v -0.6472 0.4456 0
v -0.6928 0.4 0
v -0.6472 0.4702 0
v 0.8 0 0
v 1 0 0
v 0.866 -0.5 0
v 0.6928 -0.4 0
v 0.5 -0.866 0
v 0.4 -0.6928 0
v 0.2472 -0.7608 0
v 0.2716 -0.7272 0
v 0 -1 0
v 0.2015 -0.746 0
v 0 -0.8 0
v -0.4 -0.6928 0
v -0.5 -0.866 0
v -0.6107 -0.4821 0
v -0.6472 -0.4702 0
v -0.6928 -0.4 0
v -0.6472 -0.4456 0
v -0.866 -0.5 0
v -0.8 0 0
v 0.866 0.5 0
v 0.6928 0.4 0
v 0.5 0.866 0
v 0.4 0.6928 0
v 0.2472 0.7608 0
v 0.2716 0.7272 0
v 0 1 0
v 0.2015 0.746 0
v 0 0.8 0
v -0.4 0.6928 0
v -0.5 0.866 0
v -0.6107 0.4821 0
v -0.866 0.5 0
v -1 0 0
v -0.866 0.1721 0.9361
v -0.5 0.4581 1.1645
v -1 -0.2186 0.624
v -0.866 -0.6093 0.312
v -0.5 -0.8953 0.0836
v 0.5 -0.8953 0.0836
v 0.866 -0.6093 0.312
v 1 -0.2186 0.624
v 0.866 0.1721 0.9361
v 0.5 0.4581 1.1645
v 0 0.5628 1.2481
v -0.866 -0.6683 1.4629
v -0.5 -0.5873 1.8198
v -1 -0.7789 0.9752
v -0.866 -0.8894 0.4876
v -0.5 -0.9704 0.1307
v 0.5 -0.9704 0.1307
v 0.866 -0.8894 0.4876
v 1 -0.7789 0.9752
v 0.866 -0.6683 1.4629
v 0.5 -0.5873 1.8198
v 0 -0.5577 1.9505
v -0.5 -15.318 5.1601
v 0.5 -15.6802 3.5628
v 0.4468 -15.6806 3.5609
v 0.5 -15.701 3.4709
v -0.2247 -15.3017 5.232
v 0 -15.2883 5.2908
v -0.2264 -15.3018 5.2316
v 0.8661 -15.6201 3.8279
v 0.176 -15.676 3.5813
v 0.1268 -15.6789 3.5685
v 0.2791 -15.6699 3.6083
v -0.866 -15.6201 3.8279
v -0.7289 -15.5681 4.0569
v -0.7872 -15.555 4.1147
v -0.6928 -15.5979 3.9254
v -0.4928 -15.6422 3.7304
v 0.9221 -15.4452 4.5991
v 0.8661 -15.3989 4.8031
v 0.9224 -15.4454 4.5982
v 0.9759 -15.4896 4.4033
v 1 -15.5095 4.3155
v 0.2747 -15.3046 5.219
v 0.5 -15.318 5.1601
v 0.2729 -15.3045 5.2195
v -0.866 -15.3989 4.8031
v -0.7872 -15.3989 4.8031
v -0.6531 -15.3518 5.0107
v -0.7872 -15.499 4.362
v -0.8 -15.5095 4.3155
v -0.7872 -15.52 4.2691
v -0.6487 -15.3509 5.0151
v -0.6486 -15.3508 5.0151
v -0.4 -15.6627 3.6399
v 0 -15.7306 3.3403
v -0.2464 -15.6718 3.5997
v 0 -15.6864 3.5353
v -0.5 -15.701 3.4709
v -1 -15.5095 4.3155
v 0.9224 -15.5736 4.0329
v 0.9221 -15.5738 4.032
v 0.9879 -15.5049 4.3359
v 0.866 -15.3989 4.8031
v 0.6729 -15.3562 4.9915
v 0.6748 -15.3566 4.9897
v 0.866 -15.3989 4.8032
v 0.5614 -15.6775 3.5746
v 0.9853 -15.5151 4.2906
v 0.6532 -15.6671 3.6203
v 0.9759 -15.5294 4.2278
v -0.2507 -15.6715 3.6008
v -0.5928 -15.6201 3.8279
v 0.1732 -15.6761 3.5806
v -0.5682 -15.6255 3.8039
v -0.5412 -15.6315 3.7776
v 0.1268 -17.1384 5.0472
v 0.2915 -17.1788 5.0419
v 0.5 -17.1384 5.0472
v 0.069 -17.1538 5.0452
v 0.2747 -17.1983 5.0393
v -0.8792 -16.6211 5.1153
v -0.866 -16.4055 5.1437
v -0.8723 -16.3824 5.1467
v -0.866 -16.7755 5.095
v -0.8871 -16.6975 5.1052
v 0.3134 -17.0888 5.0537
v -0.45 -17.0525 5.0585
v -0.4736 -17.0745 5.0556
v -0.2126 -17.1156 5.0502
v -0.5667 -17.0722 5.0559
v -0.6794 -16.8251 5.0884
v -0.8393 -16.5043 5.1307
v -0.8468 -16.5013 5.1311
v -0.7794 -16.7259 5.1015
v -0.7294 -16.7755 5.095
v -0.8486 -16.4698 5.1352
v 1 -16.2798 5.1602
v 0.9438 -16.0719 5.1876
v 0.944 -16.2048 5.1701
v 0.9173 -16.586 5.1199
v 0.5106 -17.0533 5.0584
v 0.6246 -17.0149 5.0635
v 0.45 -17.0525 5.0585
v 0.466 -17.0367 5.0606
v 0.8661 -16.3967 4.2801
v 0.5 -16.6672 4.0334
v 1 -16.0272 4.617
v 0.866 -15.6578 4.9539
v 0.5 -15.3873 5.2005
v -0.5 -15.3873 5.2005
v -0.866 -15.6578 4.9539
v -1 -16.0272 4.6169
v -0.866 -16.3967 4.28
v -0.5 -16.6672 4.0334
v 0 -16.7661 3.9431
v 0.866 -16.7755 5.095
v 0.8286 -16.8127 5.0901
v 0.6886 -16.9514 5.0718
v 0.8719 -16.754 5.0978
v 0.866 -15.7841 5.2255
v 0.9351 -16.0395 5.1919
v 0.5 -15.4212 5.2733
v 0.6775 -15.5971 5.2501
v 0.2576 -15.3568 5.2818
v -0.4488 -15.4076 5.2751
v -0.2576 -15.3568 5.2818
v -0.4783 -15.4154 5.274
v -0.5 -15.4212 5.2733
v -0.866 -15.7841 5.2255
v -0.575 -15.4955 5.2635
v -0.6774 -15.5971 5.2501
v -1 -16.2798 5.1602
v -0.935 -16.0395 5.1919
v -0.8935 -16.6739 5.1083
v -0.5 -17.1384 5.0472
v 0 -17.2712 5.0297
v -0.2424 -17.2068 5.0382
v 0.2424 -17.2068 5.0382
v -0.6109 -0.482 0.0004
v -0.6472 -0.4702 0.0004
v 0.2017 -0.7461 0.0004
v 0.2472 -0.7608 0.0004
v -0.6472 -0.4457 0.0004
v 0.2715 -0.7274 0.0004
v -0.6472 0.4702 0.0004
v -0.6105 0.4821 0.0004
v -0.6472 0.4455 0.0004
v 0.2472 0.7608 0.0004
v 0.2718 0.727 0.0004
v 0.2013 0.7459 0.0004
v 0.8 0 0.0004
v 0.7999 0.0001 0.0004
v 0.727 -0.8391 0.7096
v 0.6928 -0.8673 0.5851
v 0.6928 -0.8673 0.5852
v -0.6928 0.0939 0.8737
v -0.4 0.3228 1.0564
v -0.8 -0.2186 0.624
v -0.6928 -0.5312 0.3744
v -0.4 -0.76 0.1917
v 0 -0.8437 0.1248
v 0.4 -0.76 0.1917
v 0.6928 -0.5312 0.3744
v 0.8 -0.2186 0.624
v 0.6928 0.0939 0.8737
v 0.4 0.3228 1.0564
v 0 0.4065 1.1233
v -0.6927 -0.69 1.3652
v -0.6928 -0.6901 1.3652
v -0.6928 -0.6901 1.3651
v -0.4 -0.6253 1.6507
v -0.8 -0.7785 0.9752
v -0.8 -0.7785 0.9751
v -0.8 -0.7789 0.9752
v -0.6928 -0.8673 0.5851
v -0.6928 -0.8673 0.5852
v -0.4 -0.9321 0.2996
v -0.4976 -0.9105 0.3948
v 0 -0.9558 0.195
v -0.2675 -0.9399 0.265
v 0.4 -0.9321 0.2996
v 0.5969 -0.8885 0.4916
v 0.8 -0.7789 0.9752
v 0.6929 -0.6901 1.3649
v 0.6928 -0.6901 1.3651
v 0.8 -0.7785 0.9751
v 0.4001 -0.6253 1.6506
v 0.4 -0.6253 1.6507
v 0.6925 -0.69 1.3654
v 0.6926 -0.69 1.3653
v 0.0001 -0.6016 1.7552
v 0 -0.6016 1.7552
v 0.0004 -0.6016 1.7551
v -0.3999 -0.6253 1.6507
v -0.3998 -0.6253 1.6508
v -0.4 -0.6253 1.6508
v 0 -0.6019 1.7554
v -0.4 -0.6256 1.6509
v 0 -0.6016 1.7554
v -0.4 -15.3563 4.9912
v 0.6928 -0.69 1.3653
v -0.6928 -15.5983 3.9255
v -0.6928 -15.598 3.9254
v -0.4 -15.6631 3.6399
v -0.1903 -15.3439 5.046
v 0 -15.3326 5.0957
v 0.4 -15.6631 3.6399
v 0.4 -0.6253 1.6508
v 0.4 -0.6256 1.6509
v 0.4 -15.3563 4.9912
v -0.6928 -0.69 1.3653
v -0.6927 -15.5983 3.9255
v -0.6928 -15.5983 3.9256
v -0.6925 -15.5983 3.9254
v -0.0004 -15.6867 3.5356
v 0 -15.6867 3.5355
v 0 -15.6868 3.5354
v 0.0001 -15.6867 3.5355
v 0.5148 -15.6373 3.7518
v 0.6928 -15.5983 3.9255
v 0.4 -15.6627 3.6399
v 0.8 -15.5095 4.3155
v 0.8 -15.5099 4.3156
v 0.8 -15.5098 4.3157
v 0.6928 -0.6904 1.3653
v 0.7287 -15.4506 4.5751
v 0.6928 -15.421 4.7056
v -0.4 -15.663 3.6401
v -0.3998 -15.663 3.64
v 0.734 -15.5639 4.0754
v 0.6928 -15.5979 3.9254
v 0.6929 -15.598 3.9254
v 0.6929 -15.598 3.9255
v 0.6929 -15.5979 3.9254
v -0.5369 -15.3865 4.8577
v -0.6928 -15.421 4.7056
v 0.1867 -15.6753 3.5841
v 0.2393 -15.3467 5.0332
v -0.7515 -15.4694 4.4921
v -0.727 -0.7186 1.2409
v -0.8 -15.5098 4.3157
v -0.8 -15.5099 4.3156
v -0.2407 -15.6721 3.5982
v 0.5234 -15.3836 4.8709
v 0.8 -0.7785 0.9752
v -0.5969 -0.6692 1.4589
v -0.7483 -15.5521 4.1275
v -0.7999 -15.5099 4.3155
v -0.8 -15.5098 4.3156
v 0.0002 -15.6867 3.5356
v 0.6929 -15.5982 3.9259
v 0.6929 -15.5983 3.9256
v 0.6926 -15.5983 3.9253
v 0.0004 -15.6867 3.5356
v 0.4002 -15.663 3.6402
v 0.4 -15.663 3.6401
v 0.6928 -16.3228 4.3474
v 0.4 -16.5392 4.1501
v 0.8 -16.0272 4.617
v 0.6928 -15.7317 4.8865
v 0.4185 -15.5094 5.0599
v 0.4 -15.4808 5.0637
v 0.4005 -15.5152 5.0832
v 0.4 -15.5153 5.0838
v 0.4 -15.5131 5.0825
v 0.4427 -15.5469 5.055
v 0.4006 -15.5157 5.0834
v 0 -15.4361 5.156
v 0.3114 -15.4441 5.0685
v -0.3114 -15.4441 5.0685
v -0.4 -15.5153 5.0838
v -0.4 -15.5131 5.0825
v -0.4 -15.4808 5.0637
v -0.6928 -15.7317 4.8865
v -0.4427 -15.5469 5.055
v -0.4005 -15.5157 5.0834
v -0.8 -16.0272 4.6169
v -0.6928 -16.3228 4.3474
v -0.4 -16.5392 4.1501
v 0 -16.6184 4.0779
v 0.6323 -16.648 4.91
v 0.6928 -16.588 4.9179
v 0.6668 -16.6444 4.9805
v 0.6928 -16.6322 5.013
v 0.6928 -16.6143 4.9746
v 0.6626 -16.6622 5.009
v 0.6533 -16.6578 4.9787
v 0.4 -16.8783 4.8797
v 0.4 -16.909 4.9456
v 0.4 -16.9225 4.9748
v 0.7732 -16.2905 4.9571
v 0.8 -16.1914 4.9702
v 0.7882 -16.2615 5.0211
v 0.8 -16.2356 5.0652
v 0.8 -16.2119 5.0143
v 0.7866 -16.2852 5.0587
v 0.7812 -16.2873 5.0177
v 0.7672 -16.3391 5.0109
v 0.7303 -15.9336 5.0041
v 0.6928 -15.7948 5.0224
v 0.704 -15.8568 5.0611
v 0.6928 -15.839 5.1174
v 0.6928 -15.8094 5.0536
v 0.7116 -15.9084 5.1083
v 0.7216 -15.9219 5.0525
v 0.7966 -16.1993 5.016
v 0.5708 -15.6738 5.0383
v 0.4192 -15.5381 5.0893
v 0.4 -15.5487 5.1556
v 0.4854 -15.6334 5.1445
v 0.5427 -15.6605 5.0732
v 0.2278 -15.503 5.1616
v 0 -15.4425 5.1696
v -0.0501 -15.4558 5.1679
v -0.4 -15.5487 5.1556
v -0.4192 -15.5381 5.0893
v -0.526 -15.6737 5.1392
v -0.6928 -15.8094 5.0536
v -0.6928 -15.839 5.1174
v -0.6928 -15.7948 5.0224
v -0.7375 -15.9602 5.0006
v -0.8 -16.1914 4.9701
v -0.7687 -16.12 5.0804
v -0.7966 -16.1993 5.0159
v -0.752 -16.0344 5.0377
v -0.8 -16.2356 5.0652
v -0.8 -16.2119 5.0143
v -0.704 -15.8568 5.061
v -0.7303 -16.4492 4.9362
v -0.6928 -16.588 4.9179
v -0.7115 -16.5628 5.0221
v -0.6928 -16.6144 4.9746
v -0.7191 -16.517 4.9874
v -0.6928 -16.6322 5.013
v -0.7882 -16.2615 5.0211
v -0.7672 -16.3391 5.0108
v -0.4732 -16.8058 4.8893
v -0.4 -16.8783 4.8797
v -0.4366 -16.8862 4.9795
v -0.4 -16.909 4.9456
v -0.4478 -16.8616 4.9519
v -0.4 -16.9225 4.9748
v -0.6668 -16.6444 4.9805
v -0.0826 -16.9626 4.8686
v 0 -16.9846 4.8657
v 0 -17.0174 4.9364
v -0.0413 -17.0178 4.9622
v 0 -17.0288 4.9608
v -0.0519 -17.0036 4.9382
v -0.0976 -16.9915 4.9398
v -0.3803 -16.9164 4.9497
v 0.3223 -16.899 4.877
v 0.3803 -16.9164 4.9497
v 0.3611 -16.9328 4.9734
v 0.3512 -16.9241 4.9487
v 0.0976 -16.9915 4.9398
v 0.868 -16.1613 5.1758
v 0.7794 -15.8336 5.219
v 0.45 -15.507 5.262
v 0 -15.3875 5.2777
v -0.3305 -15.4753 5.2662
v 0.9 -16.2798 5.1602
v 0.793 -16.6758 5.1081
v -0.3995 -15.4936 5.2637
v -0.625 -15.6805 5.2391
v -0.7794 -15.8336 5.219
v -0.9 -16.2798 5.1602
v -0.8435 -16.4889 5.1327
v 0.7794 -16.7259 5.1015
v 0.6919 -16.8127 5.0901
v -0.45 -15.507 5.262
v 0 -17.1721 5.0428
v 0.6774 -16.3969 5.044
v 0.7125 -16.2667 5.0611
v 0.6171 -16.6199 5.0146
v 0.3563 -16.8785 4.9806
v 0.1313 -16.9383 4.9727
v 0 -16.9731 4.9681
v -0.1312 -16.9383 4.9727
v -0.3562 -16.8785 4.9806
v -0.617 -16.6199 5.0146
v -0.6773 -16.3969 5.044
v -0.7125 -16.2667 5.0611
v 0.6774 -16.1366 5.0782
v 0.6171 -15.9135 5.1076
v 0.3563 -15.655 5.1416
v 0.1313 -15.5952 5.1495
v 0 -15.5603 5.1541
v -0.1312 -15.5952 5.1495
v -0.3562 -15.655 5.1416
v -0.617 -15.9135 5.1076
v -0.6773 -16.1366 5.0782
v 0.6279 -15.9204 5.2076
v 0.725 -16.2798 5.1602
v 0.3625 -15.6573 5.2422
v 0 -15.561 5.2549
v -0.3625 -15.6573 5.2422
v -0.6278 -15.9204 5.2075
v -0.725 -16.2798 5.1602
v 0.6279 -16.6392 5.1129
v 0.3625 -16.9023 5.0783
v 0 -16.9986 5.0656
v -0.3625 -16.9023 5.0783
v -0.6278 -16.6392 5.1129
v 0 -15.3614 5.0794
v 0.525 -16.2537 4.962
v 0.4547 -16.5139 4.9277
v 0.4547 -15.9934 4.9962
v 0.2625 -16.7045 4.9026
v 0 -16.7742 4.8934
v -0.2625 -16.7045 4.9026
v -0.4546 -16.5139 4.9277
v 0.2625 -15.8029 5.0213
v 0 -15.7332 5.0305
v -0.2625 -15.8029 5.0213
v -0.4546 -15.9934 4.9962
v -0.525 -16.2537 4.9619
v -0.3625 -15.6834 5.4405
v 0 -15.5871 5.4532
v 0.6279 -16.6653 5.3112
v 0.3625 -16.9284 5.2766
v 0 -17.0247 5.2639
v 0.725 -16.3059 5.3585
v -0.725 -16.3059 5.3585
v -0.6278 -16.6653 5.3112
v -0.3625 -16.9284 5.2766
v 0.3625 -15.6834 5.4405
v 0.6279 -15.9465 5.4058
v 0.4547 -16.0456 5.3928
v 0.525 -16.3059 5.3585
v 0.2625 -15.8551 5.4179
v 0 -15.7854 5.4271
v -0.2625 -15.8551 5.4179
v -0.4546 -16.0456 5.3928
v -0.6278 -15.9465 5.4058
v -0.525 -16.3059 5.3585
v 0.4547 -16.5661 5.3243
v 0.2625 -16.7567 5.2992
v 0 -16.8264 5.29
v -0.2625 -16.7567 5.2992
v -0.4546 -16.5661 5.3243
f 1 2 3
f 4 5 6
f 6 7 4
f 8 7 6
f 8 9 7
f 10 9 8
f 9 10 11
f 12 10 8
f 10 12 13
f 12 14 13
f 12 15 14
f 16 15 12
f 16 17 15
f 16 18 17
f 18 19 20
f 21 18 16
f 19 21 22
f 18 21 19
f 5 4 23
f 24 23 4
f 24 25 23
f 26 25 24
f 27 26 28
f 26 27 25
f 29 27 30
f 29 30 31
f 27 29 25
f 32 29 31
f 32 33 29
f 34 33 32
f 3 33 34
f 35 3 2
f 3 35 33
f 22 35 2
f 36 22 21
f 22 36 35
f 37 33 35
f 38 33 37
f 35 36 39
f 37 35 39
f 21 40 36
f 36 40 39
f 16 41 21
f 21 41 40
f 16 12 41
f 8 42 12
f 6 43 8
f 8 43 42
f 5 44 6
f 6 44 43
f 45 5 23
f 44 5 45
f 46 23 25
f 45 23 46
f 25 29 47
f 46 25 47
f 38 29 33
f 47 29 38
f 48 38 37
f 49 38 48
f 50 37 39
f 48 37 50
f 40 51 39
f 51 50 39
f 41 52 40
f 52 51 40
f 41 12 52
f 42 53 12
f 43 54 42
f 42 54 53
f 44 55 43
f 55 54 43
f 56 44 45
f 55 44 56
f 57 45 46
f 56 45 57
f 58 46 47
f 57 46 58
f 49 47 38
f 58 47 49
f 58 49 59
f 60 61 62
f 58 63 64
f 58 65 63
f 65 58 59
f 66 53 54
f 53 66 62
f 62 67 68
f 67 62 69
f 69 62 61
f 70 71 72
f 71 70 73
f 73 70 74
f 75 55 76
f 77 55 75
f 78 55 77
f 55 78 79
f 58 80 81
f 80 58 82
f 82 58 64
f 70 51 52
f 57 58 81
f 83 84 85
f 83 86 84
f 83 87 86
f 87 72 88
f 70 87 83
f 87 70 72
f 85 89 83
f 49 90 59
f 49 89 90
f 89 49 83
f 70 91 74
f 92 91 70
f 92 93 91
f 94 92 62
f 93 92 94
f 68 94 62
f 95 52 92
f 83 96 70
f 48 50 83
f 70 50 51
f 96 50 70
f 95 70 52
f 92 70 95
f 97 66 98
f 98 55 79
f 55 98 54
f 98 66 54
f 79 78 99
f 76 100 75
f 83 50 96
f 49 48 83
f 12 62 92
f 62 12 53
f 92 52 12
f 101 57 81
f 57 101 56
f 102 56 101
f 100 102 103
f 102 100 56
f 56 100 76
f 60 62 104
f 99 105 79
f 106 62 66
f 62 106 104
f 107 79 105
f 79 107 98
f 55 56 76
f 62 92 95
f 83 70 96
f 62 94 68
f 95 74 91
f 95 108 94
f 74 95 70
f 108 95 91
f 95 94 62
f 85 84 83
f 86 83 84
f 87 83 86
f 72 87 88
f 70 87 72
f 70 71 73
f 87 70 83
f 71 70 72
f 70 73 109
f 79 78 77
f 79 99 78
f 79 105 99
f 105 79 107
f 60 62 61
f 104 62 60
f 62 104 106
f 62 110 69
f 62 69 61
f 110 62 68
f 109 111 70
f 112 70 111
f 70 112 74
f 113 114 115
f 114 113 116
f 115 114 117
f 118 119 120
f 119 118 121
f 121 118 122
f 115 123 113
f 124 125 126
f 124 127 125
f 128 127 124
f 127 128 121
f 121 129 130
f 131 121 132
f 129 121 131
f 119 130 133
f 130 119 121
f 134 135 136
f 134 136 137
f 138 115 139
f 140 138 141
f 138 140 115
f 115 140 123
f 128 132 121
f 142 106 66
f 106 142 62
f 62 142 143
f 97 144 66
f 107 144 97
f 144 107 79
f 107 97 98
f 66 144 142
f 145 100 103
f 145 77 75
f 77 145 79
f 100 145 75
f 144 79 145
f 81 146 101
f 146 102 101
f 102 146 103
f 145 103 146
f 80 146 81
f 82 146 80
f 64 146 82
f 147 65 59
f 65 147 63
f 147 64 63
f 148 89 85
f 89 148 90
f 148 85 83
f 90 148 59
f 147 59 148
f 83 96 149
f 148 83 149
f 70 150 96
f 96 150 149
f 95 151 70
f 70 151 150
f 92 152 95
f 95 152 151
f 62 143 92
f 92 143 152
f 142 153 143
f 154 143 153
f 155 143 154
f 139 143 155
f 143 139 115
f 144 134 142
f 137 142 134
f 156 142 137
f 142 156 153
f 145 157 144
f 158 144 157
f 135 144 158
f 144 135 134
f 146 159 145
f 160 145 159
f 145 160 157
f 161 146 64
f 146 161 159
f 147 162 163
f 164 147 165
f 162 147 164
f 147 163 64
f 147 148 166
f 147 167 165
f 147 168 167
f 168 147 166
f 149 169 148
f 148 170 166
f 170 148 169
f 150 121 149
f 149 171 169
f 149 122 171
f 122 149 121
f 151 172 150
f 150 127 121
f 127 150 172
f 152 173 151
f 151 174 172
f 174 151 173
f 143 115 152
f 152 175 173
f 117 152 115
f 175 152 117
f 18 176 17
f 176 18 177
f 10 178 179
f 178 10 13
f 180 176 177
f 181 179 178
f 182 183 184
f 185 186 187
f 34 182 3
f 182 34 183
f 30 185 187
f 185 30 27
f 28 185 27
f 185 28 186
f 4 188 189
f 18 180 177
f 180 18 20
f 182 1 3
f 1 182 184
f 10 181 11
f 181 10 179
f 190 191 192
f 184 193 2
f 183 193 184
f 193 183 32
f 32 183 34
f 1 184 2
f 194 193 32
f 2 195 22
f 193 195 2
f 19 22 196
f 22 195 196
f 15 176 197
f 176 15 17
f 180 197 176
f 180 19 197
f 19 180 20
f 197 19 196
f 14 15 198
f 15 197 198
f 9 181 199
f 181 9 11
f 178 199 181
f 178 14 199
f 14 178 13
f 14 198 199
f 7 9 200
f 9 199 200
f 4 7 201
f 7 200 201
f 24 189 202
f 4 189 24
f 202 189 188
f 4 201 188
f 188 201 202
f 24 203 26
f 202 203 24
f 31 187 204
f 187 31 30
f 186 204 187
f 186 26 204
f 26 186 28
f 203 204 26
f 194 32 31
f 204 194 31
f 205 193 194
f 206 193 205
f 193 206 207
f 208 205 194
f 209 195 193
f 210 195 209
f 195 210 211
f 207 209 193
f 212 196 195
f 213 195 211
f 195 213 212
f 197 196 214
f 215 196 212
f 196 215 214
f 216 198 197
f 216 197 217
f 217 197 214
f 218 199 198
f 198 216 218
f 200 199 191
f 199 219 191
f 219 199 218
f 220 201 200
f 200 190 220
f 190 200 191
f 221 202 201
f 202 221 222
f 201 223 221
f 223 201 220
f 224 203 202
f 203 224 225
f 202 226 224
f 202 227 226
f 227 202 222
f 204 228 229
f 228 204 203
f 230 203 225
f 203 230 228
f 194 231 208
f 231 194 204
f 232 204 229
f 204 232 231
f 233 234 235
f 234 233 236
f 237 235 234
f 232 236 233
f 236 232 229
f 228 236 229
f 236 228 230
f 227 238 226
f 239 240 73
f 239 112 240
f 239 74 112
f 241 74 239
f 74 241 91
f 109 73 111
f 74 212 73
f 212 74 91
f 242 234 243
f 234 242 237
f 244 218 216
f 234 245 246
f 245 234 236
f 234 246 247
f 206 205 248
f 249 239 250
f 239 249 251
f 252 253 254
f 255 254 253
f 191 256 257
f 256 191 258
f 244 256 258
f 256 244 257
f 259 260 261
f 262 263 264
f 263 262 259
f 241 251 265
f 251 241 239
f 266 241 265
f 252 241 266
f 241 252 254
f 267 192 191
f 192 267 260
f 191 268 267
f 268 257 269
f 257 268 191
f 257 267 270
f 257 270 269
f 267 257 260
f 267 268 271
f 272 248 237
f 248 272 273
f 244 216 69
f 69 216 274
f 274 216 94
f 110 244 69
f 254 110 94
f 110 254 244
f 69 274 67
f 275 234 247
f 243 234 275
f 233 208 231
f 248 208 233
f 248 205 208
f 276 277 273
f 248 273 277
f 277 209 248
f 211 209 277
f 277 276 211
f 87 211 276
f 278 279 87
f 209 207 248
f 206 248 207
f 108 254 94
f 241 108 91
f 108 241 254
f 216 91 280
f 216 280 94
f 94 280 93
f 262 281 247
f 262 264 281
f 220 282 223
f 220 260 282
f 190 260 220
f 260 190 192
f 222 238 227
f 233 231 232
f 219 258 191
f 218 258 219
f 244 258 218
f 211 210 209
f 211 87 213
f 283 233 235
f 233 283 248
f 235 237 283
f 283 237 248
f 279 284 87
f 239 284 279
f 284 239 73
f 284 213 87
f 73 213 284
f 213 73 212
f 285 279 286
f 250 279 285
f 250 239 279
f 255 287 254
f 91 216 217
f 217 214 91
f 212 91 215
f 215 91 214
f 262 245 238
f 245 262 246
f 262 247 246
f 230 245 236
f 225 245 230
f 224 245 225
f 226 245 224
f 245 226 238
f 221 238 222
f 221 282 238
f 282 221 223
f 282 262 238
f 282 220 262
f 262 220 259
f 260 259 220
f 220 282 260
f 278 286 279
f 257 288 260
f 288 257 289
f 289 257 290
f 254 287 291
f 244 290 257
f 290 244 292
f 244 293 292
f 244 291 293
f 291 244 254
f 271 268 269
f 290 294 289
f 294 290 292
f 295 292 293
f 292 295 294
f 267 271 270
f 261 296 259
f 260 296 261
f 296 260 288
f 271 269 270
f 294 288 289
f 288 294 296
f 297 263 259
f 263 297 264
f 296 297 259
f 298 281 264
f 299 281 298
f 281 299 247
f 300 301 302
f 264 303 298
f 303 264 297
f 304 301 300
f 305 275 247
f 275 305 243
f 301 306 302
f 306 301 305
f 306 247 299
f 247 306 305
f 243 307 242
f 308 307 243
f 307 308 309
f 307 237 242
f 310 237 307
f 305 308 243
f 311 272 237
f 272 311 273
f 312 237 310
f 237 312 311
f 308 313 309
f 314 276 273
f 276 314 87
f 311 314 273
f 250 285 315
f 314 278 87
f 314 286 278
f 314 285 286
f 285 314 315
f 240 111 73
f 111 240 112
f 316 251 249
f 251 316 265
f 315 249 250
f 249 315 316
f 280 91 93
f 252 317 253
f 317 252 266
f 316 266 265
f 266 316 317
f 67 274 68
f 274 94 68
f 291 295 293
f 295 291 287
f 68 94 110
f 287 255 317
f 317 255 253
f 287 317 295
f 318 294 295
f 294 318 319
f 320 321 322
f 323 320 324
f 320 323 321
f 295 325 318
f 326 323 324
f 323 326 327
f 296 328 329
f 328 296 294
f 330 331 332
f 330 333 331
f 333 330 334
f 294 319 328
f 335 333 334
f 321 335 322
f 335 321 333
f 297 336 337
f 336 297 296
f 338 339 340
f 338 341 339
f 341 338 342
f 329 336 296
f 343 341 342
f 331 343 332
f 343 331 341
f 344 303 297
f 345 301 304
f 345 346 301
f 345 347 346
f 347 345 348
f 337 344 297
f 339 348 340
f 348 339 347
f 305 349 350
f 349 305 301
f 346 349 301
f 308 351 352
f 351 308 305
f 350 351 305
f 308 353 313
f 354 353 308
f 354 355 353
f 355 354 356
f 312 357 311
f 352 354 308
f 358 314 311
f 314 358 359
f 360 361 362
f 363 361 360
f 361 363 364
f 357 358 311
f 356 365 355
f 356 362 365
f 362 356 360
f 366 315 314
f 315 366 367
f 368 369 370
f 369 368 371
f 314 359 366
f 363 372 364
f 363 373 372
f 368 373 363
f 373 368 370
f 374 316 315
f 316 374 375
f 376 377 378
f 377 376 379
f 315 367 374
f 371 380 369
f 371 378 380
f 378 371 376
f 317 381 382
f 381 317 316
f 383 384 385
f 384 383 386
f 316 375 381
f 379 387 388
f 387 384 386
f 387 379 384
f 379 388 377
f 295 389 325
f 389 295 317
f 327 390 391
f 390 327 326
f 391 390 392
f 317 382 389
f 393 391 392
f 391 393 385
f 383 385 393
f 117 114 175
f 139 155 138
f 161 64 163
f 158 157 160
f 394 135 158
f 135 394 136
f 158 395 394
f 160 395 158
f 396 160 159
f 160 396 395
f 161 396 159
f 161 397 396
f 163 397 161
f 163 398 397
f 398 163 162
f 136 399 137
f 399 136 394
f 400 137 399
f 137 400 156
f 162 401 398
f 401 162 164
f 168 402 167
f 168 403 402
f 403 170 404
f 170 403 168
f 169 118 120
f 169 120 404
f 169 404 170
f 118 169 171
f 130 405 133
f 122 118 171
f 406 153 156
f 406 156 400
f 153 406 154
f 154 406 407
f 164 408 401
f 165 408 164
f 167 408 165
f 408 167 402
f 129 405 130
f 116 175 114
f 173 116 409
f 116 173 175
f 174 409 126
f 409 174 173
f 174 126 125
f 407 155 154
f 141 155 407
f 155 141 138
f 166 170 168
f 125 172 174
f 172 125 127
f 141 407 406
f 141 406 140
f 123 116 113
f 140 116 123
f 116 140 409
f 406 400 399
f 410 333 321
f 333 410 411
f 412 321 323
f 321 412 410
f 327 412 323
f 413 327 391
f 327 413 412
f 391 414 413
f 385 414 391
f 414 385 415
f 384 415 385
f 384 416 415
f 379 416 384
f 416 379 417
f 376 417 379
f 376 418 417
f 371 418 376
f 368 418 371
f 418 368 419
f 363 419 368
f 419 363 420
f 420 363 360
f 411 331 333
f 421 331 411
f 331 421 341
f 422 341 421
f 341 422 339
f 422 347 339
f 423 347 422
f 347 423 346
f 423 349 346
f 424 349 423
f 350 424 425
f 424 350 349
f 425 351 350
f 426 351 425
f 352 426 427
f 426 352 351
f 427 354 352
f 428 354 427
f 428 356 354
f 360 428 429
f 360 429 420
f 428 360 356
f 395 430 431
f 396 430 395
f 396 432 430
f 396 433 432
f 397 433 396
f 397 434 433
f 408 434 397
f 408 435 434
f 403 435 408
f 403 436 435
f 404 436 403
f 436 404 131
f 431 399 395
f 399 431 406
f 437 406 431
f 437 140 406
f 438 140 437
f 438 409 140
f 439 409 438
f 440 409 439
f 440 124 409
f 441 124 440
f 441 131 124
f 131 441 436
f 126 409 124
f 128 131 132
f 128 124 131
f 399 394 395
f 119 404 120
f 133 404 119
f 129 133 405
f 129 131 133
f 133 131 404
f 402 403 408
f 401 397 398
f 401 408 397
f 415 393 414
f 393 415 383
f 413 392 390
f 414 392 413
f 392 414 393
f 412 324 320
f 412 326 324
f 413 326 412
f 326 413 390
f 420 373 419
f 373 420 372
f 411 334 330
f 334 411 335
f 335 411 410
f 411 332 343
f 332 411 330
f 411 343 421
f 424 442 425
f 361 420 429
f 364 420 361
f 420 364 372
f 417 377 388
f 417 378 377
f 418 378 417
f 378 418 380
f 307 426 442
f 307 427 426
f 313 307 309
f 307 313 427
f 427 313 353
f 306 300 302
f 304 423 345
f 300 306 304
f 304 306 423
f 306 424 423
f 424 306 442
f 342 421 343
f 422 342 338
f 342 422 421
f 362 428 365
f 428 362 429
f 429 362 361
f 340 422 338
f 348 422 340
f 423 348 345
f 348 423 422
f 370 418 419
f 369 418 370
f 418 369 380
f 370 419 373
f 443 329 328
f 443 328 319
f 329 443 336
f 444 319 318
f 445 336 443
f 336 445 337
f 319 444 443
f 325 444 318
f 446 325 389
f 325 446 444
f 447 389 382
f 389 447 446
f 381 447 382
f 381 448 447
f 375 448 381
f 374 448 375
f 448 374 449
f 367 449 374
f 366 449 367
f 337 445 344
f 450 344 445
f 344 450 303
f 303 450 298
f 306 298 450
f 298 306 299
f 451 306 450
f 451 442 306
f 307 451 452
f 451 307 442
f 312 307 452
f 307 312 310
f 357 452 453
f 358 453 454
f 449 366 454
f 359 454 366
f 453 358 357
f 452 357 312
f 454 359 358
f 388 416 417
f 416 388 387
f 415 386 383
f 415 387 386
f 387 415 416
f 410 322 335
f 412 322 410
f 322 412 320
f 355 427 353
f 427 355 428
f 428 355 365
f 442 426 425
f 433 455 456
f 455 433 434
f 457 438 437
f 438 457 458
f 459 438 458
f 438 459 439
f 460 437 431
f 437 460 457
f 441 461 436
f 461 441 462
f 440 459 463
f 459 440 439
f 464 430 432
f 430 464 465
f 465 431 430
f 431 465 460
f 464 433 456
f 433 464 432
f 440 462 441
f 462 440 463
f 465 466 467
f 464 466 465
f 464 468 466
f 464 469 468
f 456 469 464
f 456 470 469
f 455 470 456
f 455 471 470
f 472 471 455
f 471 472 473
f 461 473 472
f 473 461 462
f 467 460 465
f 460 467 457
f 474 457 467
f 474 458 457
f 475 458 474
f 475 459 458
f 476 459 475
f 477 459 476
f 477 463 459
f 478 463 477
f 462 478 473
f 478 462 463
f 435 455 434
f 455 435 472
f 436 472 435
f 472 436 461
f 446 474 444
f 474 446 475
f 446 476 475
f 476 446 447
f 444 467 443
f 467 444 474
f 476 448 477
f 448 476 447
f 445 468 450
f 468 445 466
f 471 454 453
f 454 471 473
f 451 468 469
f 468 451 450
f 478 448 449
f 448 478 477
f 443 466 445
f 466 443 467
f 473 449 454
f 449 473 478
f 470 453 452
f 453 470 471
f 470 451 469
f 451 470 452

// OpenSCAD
tolerance=0.075;
hole_radius=0.05;
grid_hole_radius=0.05;
outer_radius=1;
thickness=0.2;
hole_attach_height=0.05;
attach_thickness=0.1;

//parameters that don't have to be defined explicitly
eps = tolerance/100;
inner_radius = outer_radius - thickness;
fn = 12;
fnh = 6;

module angled_cylinder(angle_deg_y, _h, _r, angle_deg_x = 0) {
    rotate([angle_deg_x, angle_deg_y, 0]) { // Rotate the cylinder 
            cylinder(h = _h, r = _r, center = true, $fn = fnh);
        }
}

module hole(_h) {
    cylinder(h = _h, r = grid_hole_radius, $fn = fnh);
}

//makes circle of holes
module circular_grid(_h, _r, _n) {
    for (i = [0:_n-1]) {
        angle = i * 360 / _n;
        x_pos = _r * cos(angle);
        y_pos = _r * sin(angle);
        translate([x_pos, y_pos, -eps]) {
            hole(_h);
        }
    }
}

//makes grid of holes
module hole_grid(hole_height, grid_h) {
    translate([0,0,hole_height]) {
        difference() {
            //cylinder
            cylinder(h = grid_h, r = (inner_radius + outer_radius)/2, 
                center=false, $fn = fn);
            //holes
            for (i = [0 : grid_hole_radius * 2 + hole_attach_height : inner_radius - grid_hole_radius * 2]) {
                circular_grid(grid_h + eps*2, i, ceil(6.28*i/(grid_hole_radius*4)));
            }
            
        } 
    }
}

//makes curve of CSC
module curve(_radius, _twist, _turning_angle, _turning_radius) {
    rotate([90,0,_twist])
    translate([-_turning_radius, 0, 0])
    rotate_extrude(angle=_turning_angle, convexity=100, $fn = fn)
    translate([_turning_radius, 0]) circle(_radius);
}

module CSC(_r, _t1, _ta1, _tr1, _h, _t2, _ta2, _tr2, is_inner) {
    
    if (_ta1 > 90) {
        CSC(_r, _t1, 90, _tr1, 0, 0, 0, 0, is_inner);
        
        pos1 = (-_tr1 + sqrt(_tr1*_tr1 - pow(_tr1,2)));
        translate([pos1*cos(_t1),pos1*sin(_t1),_tr1])
        rotate([0,-90,_t1])
        CSC(_r, 0, _ta1 - 90, _tr1, _h, _t2, _ta2, _tr2, is_inner);
    } else if (_ta2 > 90) {
        CSC(_r, _t1, _ta1, _tr1, _h, _t2, 90, _tr2, is_inner);
        
        pos1 = (-_tr1 + sqrt(_tr1*_tr1 - pow(_tr1*sin(_ta1),2)));
        pos2 = (-_tr2 + sqrt(_tr2*_tr2 - pow(_tr2,2)));
        translate([pos1*cos(_t1),pos1*sin(_t1),_tr1*sin(_ta1)])
        rotate([0,-_ta1,_t1])
        translate([0, 0, _h])
        translate([pos2*cos(_t2),pos2*sin(_t2),_tr2])
        rotate([0,-90,_t2])
        CSC(_r, 0, 0, 0, 0, 0, _ta2 - 90, _tr2, is_inner);
    } else {
        //intermediate positions
        pos1 = (-_tr1 + sqrt(_tr1*_tr1 - pow(_tr1*sin(_ta1),2)));
        pos2 = (-_tr2 + sqrt(_tr2*_tr2 - pow(_tr2*sin(_ta2),2)));
        
        union() {
            //bottom shell threshold
            if (is_inner) {
                cylinder(h=eps, r=_r, center=true);
            }
            
            //first curve of CSC
            curve(_r, _t1, _ta1, _tr1);
            
            //straight link of CSC
            translate([pos1*cos(_t1),pos1*sin(_t1),_tr1*sin(_ta1)])
            rotate([0,-_ta1,_t1])
            if (is_inner) {
                //add threshold for shelling
                translate([0,0,-eps /2])
                cylinder(h=_h + eps,r=_r, center = false, $fn= fn);
            } else {
                cylinder(h=_h,r=_r, center = false, $fn= fn);
            }
            
            //second curve of CSC
            translate([pos1*cos(_t1),pos1*sin(_t1),_tr1*sin(_ta1)])
            rotate([0,-_ta1,_t1])
            translate([0, 0, _h])
            curve(_r, _t2, _ta2, _tr2);
            
            //shelling thresholds
            if (is_inner) {
                translate([pos1*cos(_t1),pos1*sin(_t1),_tr1*sin(_ta1)])
                rotate([0,-_ta1,_t1])
                translate([0, 0, _h])
                translate([pos2*cos(_t2),pos2*sin(_t2),_tr2*sin(_ta2)])
                rotate([0,-_ta2,_t2]) {
                    cylinder(h=eps, r=_r, center=true,$fn=fn);
                }
            
            }
        }
    }
    
}

//allow modules to attach
module CSC_ATTACH(_r, _t1, _ta1, _tr1, _h, _t2, _ta2, _tr2, next_hole_radius, next_hole_attach_height, next_inner) {
    
    if (_ta1 > 90) {        
        pos1 = (-_tr1 + sqrt(_tr1*_tr1 - pow(_tr1,2)));
        translate([pos1*cos(_t1),pos1*sin(_t1),_tr1])
        rotate([0,-90,_t1])
        CSC_ATTACH(_r, 0, _ta1 - 90, _tr1, _h, _t2, _ta2, _tr2, next_hole_radius, next_hole_attach_height, next_inner);
    } else if (_ta2 > 90) {        
        pos1 = (-_tr1 + sqrt(_tr1*_tr1 - pow(_tr1*sin(_ta1),2)));
        pos2 = (-_tr2 + sqrt(_tr2*_tr2 - pow(_tr2,2)));
        translate([pos1*cos(_t1),pos1*sin(_t1),_tr1*sin(_ta1)])
        rotate([0,-_ta1,_t1])
        translate([0, 0, _h])
        translate([pos2*cos(_t2),pos2*sin(_t2),_tr2])
        rotate([0,-90,_t2])
        CSC_ATTACH(_r, 0, 0, 0, 0, 0, _ta2 - 90, _tr2, next_hole_radius, next_hole_attach_height, next_inner);
    } else {
        //intermediate positions
        pos1 = (-_tr1 + sqrt(_tr1*_tr1 - pow(_tr1*sin(_ta1),2)));
        pos2 = (-_tr2 + sqrt(_tr2*_tr2 - pow(_tr2*sin(_ta2),2)));
        
        translate([pos1*cos(_t1),pos1*sin(_t1),_tr1*sin(_ta1)])
        rotate([0,-_ta1,_t1])
        translate([0, 0, _h])
        translate([pos2*cos(_t2),pos2*sin(_t2),_tr2*sin(_ta2)])
        rotate([0,-_ta2,_t2]) {
            difference() {
                union() {
                    //attachment for smaller cylinder
                    translate([0,0,-attach_thickness])
                    cylinder(h=attach_thickness, r=_r - thickness/2, $fn=fn);
                    translate([0,0,-attach_thickness*2])
                    cylinder(h=attach_thickness*2, r1=_r - thickness/2, r2=next_inner - tolerance - thickness, $fn=fn);
                    
                    //small cylinder
                    cylinder(h=next_hole_radius*2 + next_hole_attach_height * 2, r = next_inner - tolerance, $fn=fn);
                }
                
                //shelling
                translate([0,0, -attach_thickness*2 - eps/2])
                cylinder(h=next_hole_radius*2 + next_hole_attach_height * 2 + attach_thickness*2 + eps, r = min(inner_radius, next_inner - tolerance - thickness), $fn=fn);
                
                //holes for screws
    //            translate([0,0,next_hole_attach_height + next_hole_radius]) {
    //                angled_cylinder(0, (next_inner + thickness + eps) * 2,  hole_radius, 90);
    //                angled_cylinder(90, (next_inner + thickness + eps) * 2, hole_radius, 0);
    //            }
            }
        }
    }
}

//remove overlap to allow all branches to attach to each other
module CSC_REMOVE_OVERLAP(_r, _t1, _ta1, _tr1, _h, _t2, _ta2, _tr2, next_hole_radius, next_hole_attach_height, next_inner) {
    if (_ta1 > 90) {        
        pos1 = (-_tr1 + sqrt(_tr1*_tr1 - pow(_tr1,2)));
        translate([pos1*cos(_t1),pos1*sin(_t1),_tr1])
        rotate([0,-90,_t1])
        CSC_REMOVE_OVERLAP(_r, 0, _ta1 - 90, _tr1, _h, _t2, _ta2, _tr2, next_hole_radius, next_hole_attach_height, next_inner);
    } else if (_ta2 > 90) {        
        pos1 = (-_tr1 + sqrt(_tr1*_tr1 - pow(_tr1*sin(_ta1),2)));
        pos2 = (-_tr2 + sqrt(_tr2*_tr2 - pow(_tr2,2)));
        translate([pos1*cos(_t1),pos1*sin(_t1),_tr1*sin(_ta1)])
        rotate([0,-_ta1,_t1])
        translate([0, 0, _h])
        translate([pos2*cos(_t2),pos2*sin(_t2),_tr2])
        rotate([0,-90,_t2])
        CSC_REMOVE_OVERLAP(_r, 0, 0, 0, 0, 0, _ta2 - 90, _tr2, next_hole_radius, next_hole_attach_height, next_inner);
    } else {
        pos1 = (-_tr1 + sqrt(_tr1*_tr1 - pow(_tr1*sin(_ta1),2)));
        pos2 = (-_tr2 + sqrt(_tr2*_tr2 - pow(_tr2*sin(_ta2),2)));
        
        translate([pos1*cos(_t1),pos1*sin(_t1),_tr1*sin(_ta1)])
        rotate([0,-_ta1,_t1])
        translate([0, 0, _h])
        translate([pos2*cos(_t2),pos2*sin(_t2),_tr2*sin(_ta2)])
        rotate([0,-_ta2,_t2]) {
            cylinder(h=999999, r=_r + tolerance, $fn=fn);
        }
    }
}

//c is _t1, _ta1, _tr1, _h, _t2, _ta2, _tr2, next hole radius, next hole height, next inner radius
module branch(branch_list, _outer, _inner) {
    union() {
        //make grid of holes
        //hole_grid(hole_radius*2 + hole_attach_height * 2, grid_hole_radius);
        
        //make CSC shells for each CSC in branch_list
        difference() {
            for (c = branch_list) {
                CSC(_outer,c[0],c[1],c[2],c[3],c[4],c[5],c[6], false);
            }
            
            for (c = branch_list) {
                CSC(_inner,c[0],c[1],c[2],c[3],c[4],c[5],c[6], true);
                CSC_REMOVE_OVERLAP(_outer,c[0],c[1],c[2],c[3],c[4],c[5],c[6],c[7], c[8], c[9]);
            }
            
            //make screw holes at the bottom
//            translate([0,0,hole_radius + hole_attach_height]) {
//                angled_cylinder(0, (outer_radius*1.5 + eps) * 2,  hole_radius, 90);
//                angled_cylinder(90, (outer_radius*1.5 + eps) * 2, hole_radius, 0);
//            }    
        }
        for (c=branch_list) {     
            CSC_ATTACH(_outer,c[0],c[1],c[2],c[3],c[4],c[5],c[6], c[7], c[8], c[9]);
        }
    }
}

branch([
[ 90.0001, 77.2238, 1.0*outer_radius, 15.1046*outer_radius, -179.9995, 69.7238, 1.0*outer_radius, 0.05, 0.05, 0.8],
],outer_radius,inner_radius);
